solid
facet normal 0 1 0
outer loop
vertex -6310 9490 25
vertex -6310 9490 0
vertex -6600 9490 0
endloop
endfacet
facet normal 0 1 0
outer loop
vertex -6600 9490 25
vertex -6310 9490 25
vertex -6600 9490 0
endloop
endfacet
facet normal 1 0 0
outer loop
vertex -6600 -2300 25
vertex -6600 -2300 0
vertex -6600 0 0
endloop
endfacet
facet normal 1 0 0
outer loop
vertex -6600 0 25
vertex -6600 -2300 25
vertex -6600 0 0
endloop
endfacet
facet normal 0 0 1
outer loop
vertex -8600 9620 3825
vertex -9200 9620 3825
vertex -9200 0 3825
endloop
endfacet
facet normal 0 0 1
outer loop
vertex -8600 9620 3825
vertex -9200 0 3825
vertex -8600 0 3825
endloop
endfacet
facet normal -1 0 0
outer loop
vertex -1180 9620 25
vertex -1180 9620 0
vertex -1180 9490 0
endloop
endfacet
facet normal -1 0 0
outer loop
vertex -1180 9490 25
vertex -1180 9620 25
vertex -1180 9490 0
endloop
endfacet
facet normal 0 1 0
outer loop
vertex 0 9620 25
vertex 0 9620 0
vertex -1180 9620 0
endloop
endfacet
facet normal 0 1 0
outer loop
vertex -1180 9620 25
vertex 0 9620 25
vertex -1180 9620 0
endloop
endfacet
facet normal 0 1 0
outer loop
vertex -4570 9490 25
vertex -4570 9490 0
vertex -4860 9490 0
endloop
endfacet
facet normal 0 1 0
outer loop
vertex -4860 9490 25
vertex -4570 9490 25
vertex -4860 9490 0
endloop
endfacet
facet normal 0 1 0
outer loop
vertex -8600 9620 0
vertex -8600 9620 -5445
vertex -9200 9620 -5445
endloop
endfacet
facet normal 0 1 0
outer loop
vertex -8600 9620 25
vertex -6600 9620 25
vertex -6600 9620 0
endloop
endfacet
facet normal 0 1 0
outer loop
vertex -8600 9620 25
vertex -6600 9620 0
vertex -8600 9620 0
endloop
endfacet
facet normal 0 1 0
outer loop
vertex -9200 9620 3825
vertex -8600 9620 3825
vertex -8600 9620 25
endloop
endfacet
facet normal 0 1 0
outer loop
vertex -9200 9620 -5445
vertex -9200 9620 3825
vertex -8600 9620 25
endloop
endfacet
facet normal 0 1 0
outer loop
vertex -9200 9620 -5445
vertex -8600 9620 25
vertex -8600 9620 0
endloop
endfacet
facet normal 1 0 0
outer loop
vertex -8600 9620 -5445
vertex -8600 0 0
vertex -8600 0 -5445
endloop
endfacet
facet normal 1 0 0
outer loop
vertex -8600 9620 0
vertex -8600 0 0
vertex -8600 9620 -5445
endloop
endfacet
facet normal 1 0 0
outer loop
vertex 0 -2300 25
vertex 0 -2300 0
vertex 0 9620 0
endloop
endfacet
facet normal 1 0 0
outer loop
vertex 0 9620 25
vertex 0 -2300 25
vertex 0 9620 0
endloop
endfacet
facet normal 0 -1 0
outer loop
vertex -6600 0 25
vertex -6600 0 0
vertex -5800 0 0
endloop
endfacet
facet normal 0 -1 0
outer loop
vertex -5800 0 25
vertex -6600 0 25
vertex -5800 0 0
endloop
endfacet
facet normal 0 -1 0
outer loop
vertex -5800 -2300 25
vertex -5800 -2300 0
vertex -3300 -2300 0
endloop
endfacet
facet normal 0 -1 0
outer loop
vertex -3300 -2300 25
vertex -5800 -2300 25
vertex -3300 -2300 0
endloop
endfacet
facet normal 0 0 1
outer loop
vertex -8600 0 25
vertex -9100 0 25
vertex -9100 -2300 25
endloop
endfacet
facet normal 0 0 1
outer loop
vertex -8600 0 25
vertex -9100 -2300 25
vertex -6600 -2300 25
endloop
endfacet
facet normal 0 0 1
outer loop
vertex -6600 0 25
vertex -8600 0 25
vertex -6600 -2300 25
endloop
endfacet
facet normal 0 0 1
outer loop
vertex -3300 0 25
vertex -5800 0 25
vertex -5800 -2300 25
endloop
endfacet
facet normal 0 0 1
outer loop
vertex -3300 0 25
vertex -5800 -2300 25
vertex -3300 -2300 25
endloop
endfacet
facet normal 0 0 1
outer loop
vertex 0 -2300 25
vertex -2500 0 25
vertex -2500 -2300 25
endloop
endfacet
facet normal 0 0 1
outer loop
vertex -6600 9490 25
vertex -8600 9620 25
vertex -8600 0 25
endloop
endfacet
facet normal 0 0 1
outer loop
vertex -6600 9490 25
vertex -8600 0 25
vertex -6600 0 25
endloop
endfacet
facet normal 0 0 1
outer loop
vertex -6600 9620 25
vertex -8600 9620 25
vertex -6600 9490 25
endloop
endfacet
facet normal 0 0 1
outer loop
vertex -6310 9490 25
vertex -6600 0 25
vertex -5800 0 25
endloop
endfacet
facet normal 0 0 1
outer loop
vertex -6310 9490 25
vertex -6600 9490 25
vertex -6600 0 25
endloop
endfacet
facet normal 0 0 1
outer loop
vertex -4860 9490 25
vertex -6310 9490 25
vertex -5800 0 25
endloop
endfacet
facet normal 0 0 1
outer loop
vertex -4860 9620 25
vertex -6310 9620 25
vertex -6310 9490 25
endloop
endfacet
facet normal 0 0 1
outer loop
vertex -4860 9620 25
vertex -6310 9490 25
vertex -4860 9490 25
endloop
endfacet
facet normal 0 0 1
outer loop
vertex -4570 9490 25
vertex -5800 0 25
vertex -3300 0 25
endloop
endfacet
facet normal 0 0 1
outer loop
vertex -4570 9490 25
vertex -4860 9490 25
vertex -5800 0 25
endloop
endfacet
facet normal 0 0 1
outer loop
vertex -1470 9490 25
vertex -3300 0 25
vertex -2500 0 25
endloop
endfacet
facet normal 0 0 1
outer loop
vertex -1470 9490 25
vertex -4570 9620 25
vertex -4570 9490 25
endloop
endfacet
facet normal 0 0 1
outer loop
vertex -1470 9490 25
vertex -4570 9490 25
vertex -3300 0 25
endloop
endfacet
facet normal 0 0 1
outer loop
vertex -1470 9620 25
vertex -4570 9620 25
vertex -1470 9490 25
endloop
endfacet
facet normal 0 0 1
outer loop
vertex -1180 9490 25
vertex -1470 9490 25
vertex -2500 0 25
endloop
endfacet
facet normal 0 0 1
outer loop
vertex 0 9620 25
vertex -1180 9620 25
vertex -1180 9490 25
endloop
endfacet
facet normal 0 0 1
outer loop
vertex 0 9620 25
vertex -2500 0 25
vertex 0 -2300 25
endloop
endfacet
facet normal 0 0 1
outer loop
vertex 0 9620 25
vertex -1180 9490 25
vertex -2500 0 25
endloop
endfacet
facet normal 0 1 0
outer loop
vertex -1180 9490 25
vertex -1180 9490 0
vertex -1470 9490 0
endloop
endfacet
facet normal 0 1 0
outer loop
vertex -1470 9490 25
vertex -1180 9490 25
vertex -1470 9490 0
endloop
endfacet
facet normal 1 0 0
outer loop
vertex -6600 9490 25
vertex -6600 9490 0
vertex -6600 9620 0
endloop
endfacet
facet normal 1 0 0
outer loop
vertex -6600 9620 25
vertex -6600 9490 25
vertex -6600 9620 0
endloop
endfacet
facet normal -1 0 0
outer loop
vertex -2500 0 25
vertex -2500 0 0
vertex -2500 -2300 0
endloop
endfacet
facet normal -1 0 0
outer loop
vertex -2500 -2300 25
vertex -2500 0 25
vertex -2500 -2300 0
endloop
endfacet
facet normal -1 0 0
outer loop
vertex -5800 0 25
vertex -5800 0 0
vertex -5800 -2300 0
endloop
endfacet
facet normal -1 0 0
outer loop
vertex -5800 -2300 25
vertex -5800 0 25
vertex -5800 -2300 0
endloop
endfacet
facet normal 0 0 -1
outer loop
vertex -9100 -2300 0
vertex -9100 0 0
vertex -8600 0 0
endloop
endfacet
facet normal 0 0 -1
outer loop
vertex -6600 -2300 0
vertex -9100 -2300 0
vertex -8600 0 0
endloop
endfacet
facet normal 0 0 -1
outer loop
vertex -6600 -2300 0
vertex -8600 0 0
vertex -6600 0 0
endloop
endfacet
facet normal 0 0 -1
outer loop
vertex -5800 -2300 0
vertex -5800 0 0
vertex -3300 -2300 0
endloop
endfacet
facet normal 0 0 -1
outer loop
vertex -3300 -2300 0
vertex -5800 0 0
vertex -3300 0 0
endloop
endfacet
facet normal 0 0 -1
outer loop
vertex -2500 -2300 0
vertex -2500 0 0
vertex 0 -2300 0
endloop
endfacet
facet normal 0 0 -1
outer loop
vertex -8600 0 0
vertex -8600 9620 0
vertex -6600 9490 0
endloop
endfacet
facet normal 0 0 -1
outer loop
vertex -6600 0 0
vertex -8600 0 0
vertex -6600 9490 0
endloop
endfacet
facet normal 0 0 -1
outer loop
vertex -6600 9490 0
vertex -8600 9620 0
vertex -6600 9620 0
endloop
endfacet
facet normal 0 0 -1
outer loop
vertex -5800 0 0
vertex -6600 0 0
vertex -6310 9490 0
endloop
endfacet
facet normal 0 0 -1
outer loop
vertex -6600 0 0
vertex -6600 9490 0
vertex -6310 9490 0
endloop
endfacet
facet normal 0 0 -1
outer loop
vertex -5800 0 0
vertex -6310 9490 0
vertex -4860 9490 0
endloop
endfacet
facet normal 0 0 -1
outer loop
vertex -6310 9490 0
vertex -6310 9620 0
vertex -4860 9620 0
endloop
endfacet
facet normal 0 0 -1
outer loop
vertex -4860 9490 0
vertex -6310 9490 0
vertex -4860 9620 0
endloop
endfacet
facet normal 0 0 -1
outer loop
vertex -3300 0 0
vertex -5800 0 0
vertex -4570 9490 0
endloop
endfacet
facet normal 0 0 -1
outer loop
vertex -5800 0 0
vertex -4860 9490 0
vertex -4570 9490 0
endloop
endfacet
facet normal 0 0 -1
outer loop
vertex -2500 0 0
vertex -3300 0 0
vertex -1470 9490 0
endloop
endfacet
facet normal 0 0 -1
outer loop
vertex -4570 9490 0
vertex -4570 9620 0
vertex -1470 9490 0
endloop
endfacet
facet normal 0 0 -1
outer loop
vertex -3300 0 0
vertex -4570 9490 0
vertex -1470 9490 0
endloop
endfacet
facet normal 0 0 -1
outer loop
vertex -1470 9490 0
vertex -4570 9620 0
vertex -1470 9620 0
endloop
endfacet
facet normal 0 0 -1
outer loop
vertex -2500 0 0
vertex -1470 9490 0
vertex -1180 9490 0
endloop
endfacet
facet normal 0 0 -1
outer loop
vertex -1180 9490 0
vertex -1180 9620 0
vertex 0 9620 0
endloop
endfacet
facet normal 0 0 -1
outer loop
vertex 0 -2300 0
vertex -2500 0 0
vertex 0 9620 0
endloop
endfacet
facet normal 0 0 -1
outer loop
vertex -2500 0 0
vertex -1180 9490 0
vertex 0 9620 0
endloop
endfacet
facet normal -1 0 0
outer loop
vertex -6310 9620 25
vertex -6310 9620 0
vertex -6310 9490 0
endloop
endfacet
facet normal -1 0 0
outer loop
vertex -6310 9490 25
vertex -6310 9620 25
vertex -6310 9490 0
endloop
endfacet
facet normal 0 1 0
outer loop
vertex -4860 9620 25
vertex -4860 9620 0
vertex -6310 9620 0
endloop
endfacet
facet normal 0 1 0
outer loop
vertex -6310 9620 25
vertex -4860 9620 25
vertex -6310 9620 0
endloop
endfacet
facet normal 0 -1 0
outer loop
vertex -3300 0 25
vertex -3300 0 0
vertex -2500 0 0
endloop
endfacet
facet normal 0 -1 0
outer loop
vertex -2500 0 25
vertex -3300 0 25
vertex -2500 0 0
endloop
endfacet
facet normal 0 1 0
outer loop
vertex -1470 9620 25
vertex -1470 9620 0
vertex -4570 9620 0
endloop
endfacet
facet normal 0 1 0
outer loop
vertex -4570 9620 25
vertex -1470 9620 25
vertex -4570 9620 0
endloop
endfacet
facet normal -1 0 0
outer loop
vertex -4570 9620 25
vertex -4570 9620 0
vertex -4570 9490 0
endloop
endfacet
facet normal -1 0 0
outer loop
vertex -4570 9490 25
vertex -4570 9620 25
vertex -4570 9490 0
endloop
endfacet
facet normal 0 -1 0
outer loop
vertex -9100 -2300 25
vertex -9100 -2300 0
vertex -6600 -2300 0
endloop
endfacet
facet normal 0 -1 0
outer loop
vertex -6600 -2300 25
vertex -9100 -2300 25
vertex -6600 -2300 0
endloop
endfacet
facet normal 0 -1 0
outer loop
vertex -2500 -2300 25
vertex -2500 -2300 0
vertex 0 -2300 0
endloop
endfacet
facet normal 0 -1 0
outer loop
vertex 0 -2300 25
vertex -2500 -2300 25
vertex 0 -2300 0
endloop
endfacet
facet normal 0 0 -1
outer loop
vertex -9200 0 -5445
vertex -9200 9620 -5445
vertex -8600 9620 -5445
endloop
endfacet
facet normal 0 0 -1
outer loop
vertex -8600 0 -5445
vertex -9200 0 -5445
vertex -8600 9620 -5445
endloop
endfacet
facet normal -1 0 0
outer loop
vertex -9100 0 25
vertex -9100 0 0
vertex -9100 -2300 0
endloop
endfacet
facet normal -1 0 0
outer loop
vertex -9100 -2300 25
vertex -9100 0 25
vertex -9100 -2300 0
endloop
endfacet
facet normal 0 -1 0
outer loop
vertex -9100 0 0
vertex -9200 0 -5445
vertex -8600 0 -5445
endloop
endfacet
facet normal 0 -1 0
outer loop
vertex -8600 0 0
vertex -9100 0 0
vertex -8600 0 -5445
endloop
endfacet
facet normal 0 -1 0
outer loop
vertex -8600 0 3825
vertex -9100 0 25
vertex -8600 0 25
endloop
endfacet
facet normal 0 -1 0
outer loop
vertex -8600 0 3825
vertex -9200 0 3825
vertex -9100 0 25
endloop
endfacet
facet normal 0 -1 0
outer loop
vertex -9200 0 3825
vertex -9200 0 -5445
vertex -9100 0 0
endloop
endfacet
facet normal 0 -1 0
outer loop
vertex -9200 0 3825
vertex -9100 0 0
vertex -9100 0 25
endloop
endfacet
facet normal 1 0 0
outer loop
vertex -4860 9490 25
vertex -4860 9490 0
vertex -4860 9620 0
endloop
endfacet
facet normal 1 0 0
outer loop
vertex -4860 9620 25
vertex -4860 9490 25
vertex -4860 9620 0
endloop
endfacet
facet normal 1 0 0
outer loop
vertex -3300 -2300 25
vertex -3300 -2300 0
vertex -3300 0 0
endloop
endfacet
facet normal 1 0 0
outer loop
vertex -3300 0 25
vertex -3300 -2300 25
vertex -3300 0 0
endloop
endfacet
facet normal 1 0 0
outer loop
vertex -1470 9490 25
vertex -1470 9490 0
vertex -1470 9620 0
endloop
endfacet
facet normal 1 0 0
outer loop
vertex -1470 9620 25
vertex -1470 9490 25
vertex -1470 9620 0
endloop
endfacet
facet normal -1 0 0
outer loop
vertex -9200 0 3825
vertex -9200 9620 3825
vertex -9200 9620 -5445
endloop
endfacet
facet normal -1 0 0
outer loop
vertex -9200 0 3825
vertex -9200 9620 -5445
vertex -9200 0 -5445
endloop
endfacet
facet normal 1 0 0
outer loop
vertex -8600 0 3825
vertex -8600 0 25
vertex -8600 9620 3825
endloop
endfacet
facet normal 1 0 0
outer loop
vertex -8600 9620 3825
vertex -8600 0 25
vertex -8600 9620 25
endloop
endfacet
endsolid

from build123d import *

# Parameters (mm, degrees)
F1_DEPTH = 25
F3_DEPTH = 5470
F4_DEPTH = 9270


# Not quite as in the source:
# - a feature names something its author has since deleted; it is built from what else it names


with BuildPart() as f1:
    # F0 (on Top) → F1 (new body)
    with BuildSketch(Plane.XY):
        Polygon((-3300, 0), (-2500, 0), (-2500, -2300), (0, -2300), (0, 0), (0, 9620), (-1180, 9620), (-1180, 9490), (-1470, 9490), (-1470, 9620), (-4570, 9620), (-4570, 9490), (-4860, 9490), (-4860, 9620), (-6310, 9620), (-6310, 9490), (-6600, 9490), (-6600, 9620), (-8600, 9620), (-8600, 0), (-9100, 0), (-9100, -2300), (-6600, -2300), (-6600, 0), (-5800, 0), (-5800, -2300), (-3300, -2300), align=None)
    extrude(amount=F1_DEPTH)



with BuildPart() as f3:
    # F2 (on face) → F3 (new body)
    with BuildSketch(Plane.XY.offset(25)):
        Polygon((-8600, 0), (-8600, 9620), (-9200, 9620), (-9200, 0), (-9100, 0), align=None)
    extrude(amount=-F3_DEPTH)


with BuildPart() as f1_1:
    add(f1.part)
    # F4 (add): a face of the model
    f4_faces = [f3.part.faces().sort_by_distance(p)[0] for p in [
        (-8900, 4810, -5445),
    ]]

    add(f3.part)  # F4 merges F3
    extrude(f4_faces, amount=-F4_DEPTH)


solid = f1_1.part
